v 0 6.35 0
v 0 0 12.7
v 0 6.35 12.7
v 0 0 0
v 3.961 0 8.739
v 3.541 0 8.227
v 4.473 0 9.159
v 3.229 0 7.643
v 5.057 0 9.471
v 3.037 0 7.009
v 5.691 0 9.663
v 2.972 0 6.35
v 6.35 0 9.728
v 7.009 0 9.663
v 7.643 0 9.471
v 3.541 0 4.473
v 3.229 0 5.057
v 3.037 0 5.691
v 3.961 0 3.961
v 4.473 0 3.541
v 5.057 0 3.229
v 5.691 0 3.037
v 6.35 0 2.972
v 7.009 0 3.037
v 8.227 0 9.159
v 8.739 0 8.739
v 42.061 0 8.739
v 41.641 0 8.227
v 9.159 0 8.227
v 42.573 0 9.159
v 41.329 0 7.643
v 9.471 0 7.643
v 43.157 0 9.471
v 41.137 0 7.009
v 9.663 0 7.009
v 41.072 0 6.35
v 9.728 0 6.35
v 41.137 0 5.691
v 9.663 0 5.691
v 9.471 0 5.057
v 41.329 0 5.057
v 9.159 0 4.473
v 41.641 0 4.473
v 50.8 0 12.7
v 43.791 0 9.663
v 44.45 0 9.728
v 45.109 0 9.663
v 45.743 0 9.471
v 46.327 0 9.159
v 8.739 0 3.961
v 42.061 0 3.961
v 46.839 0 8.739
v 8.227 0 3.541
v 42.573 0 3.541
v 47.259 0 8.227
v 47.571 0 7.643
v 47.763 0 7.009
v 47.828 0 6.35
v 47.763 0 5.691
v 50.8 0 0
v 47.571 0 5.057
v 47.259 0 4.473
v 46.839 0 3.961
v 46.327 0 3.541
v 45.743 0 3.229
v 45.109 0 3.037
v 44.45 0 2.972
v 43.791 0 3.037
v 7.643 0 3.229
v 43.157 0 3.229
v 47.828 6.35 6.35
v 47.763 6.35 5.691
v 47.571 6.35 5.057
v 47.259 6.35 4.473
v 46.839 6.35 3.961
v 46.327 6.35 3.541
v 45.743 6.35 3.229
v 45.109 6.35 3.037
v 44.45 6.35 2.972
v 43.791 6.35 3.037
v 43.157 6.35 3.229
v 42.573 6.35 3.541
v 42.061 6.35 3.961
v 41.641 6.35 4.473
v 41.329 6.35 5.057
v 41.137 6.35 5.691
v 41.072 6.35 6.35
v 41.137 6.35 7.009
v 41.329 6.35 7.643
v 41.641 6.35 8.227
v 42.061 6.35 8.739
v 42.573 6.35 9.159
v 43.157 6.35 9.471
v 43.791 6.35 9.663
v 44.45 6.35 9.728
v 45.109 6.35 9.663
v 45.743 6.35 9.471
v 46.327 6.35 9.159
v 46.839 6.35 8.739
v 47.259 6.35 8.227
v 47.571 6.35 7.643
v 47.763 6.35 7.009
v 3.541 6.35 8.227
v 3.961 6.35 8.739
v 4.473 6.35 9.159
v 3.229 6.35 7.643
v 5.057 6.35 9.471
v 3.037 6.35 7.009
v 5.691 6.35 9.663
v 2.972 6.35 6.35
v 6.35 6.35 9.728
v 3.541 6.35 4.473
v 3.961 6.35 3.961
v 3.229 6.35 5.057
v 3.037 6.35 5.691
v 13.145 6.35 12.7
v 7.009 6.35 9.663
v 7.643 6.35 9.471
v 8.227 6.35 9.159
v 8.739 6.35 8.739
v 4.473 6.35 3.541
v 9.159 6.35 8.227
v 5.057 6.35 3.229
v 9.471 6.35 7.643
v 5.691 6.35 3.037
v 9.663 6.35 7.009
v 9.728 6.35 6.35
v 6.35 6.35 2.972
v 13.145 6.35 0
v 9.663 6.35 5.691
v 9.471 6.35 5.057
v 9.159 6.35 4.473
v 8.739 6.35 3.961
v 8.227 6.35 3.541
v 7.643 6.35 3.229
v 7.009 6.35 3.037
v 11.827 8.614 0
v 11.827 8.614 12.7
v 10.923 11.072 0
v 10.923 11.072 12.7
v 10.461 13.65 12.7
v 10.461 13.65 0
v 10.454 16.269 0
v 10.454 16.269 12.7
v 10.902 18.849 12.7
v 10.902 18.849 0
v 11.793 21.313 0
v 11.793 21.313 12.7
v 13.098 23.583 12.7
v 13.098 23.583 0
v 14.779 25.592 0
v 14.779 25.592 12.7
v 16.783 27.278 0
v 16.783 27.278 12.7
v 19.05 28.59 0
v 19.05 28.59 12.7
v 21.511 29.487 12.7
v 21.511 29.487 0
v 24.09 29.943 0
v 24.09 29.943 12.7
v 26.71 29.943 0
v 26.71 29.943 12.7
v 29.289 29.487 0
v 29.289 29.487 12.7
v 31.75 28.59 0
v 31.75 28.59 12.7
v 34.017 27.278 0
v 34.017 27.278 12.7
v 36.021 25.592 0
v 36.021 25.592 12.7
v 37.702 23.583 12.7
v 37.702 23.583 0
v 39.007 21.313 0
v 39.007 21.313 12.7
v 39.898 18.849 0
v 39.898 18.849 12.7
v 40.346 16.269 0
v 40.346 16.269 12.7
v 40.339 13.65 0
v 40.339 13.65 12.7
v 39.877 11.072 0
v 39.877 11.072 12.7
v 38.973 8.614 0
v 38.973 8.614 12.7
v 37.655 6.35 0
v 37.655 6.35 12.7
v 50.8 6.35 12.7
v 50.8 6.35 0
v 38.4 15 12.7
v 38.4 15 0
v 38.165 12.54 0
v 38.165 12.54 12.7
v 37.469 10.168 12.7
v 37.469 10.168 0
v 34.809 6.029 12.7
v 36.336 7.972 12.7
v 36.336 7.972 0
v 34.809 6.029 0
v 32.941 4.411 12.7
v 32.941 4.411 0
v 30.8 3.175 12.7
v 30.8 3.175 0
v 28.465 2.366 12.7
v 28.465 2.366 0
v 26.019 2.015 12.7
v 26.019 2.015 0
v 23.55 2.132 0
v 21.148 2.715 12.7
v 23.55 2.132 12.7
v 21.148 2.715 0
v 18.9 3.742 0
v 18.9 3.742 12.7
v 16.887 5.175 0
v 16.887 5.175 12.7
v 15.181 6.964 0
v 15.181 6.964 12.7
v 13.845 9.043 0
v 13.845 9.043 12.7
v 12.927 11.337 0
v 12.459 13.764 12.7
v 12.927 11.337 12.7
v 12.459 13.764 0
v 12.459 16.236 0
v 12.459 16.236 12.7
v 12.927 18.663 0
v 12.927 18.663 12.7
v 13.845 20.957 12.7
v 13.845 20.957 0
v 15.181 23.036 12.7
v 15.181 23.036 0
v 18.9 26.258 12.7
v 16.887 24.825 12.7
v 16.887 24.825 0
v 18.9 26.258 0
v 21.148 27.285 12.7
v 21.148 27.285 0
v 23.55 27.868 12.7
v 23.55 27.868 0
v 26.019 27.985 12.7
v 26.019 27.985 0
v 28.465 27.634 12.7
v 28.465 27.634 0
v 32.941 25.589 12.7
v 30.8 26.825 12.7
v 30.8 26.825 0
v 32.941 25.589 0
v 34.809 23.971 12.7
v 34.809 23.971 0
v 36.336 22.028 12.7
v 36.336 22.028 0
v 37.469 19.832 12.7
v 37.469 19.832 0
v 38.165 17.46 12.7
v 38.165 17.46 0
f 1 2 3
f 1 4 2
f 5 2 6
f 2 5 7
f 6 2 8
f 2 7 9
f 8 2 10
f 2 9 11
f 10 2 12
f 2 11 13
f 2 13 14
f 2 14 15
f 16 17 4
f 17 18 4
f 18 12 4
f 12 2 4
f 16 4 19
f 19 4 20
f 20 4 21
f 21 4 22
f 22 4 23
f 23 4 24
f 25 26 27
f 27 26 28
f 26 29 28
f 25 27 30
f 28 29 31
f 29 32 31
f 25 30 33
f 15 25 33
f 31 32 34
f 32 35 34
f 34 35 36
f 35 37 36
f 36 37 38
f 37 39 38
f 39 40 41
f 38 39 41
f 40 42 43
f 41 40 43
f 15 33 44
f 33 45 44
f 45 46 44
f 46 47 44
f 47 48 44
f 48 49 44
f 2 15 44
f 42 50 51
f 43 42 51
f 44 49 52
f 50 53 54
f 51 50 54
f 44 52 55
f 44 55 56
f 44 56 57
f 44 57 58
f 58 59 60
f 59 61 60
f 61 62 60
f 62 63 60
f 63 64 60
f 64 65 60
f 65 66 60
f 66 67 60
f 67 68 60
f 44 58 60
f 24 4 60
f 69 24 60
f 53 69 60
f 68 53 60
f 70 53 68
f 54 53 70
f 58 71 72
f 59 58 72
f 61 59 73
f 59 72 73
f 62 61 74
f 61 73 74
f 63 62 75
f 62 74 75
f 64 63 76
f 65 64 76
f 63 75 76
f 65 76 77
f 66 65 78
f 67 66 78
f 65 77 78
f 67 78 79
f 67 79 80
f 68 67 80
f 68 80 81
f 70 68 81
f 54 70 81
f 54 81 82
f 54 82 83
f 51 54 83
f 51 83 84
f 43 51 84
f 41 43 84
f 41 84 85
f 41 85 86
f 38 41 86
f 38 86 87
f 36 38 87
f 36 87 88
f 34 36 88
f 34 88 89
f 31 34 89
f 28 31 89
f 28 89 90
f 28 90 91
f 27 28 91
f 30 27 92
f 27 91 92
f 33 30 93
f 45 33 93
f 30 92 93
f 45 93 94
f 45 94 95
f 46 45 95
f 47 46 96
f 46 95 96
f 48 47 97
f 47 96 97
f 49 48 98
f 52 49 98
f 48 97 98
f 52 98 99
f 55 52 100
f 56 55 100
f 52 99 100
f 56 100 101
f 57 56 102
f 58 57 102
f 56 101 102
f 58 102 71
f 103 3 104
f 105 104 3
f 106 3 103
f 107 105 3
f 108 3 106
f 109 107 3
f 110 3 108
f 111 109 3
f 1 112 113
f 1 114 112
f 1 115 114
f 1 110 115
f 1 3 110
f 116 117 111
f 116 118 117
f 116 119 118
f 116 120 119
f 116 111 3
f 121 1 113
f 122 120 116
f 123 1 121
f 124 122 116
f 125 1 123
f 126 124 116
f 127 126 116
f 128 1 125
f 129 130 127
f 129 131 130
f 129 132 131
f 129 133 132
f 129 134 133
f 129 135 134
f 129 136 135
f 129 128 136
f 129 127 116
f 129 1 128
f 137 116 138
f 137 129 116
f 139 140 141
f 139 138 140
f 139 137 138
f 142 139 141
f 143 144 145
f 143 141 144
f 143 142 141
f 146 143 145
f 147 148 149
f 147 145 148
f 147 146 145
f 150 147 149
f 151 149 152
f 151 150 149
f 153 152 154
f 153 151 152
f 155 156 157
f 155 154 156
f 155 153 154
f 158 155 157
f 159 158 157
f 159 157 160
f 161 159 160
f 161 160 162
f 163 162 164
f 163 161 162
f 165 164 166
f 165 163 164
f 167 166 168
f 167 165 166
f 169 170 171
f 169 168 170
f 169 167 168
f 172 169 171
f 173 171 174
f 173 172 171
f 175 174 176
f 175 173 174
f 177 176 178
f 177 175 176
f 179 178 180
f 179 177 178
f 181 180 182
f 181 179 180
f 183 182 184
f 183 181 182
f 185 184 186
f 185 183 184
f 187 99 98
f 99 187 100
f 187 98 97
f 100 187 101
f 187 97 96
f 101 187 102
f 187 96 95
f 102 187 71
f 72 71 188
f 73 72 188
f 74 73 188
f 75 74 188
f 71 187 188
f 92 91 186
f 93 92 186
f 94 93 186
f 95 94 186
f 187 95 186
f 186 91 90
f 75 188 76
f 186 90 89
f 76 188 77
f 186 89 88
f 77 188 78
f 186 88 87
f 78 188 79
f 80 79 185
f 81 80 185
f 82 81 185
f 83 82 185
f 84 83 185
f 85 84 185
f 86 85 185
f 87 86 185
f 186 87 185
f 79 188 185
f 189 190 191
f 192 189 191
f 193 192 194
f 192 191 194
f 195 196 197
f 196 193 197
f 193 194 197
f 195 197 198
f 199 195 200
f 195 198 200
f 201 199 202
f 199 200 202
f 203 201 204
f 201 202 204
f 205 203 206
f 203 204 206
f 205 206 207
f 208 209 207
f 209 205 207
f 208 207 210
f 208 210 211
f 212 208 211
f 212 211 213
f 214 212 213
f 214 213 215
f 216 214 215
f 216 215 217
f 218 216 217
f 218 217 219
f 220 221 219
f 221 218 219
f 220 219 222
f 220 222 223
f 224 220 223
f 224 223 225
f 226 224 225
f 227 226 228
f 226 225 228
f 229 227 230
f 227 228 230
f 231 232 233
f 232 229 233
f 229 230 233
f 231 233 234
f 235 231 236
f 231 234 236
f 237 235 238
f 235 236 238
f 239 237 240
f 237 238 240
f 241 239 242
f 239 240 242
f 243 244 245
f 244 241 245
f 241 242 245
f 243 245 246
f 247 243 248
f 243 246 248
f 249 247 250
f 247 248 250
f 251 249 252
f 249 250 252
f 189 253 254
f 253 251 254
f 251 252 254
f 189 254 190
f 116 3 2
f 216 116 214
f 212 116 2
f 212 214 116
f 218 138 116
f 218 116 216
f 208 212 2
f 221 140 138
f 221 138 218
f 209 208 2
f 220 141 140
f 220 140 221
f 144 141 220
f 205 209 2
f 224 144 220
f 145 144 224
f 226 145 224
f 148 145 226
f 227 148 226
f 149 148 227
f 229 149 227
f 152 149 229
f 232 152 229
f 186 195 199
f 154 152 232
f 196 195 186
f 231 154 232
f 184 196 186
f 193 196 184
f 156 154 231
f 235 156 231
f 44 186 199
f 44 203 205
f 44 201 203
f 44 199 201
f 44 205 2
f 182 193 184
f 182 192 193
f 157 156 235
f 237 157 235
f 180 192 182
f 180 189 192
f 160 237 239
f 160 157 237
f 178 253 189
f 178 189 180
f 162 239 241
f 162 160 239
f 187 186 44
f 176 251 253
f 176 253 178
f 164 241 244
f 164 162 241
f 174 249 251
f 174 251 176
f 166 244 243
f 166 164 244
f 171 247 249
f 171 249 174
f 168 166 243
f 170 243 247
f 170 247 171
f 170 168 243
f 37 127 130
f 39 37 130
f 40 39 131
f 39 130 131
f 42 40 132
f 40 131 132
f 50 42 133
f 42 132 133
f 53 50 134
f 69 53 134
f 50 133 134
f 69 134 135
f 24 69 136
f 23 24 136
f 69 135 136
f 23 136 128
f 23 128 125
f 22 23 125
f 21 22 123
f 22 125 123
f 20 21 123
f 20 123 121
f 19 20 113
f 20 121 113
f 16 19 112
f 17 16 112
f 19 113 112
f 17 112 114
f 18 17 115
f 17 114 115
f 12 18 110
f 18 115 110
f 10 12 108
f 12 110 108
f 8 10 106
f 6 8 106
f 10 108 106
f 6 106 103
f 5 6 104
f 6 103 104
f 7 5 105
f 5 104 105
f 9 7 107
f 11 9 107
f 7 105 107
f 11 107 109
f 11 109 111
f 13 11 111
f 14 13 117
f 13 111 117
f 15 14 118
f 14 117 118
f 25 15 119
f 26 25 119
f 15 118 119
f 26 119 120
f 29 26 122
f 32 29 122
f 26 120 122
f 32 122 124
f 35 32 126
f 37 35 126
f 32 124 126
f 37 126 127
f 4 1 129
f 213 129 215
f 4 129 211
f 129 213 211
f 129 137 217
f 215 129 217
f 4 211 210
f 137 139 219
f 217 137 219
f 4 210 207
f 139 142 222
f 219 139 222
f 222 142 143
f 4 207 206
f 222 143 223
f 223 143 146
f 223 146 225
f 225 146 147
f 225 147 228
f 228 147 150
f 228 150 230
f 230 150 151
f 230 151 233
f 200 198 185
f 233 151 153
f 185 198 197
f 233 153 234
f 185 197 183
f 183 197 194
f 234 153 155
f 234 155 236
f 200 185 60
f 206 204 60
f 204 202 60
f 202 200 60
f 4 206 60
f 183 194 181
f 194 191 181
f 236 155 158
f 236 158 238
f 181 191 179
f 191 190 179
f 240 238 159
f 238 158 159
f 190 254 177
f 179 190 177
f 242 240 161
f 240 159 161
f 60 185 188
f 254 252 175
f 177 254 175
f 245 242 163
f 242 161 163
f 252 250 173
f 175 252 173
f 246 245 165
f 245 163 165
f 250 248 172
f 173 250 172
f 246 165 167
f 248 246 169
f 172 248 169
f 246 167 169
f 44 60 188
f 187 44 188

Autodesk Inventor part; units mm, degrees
ref_plane "YZ Plane" through (0, 0, 0) normal (1, 0, 0) x (0, 1, 0)
ref_plane "XZ Plane" through (0, 0, 0) normal (0, 1, 0) x (-1, 0, 0)
ref_plane "XY Plane" through (0, 0, 0) normal (0, 0, 1) x (1, 0, 0)
sketch "Sketch1" plane through (0, 0, 0) normal (0, 0, 1) x (1, 0, 0)
  line L0 (0, 0) -> (50.8, 0)
  arc A0 (37.6547, 6.35) -> (13.1453, 6.35) centre (25.4, 15) ccw
  circle A1 centre (25.4, 15) radius 13
  line L1 (0, 0) -> (0, 6.35)
  line L2 (0, 6.35) -> (13.1453, 6.35)
  line L3 (50.8, 0) -> (50.8, 6.35)
  line L4 (50.8, 6.35) -> (37.6547, 6.35)
  dimension "d0" = 50.8
  dimension "d1" = 30
  dimension "d2" = 26
  dimension "d3" = 6.35
  dimension "d4" = 6.35
  dimension "d5" = 25.4
extrude "Plate1" add sketch "Sketch1" along normal blind 12.7
sketch "Sketch2" plane through (37.6547, 6.35, 0) normal (0, 1, 0) x (1, 0, 0)
  line L0 (0, -12.7) -> (13.1453, -12.7) projected
  line L1 (13.1453, 0) -> (13.1453, -12.7) projected
  circle A0 centre (6.7953, -6.35) radius 3.3782
  circle A1 centre (-31.3047, -6.35) radius 3.3782
  line L2 (-37.6547, 0) -> (-37.6547, -12.7) projected
  line L3 (-24.5094, 0) -> (-37.6547, 0) projected
  dimension "d7" = 6.7564
  dimension "d8" = 6.7564
  dimension "d9" = 6.35
  dimension "d10" = 6.35
  dimension "d12" = 6.35
  dimension "d13" = 6.35
extrude "Cut1" cut sketch "Sketch2" against normal blind 12.7
equation "\"d14\" = Thickness"
equation "\"BendRadius\" = Thickness"
equation "\"BendReliefWidth\" = Thickness"
equation "\"BendReliefDepth\" = 0.5 * Thickness"
equation "\"CornerReliefSize\" = 4 * Thickness"
equation "\"MinimumRemnant\" = 2 * Thickness"
equation "\"TransitionRadius\" = BendRadius"
equation "\"JacobiRadiusSize\" = BendRadius"
equation "\"GapSize\" = Thickness"
equation "\"d6\" = BendRadius"
equation "\"Thickness\" = 12.7"
properties part number "Pillow block for arm bearing" material "Aluminum 6061"
